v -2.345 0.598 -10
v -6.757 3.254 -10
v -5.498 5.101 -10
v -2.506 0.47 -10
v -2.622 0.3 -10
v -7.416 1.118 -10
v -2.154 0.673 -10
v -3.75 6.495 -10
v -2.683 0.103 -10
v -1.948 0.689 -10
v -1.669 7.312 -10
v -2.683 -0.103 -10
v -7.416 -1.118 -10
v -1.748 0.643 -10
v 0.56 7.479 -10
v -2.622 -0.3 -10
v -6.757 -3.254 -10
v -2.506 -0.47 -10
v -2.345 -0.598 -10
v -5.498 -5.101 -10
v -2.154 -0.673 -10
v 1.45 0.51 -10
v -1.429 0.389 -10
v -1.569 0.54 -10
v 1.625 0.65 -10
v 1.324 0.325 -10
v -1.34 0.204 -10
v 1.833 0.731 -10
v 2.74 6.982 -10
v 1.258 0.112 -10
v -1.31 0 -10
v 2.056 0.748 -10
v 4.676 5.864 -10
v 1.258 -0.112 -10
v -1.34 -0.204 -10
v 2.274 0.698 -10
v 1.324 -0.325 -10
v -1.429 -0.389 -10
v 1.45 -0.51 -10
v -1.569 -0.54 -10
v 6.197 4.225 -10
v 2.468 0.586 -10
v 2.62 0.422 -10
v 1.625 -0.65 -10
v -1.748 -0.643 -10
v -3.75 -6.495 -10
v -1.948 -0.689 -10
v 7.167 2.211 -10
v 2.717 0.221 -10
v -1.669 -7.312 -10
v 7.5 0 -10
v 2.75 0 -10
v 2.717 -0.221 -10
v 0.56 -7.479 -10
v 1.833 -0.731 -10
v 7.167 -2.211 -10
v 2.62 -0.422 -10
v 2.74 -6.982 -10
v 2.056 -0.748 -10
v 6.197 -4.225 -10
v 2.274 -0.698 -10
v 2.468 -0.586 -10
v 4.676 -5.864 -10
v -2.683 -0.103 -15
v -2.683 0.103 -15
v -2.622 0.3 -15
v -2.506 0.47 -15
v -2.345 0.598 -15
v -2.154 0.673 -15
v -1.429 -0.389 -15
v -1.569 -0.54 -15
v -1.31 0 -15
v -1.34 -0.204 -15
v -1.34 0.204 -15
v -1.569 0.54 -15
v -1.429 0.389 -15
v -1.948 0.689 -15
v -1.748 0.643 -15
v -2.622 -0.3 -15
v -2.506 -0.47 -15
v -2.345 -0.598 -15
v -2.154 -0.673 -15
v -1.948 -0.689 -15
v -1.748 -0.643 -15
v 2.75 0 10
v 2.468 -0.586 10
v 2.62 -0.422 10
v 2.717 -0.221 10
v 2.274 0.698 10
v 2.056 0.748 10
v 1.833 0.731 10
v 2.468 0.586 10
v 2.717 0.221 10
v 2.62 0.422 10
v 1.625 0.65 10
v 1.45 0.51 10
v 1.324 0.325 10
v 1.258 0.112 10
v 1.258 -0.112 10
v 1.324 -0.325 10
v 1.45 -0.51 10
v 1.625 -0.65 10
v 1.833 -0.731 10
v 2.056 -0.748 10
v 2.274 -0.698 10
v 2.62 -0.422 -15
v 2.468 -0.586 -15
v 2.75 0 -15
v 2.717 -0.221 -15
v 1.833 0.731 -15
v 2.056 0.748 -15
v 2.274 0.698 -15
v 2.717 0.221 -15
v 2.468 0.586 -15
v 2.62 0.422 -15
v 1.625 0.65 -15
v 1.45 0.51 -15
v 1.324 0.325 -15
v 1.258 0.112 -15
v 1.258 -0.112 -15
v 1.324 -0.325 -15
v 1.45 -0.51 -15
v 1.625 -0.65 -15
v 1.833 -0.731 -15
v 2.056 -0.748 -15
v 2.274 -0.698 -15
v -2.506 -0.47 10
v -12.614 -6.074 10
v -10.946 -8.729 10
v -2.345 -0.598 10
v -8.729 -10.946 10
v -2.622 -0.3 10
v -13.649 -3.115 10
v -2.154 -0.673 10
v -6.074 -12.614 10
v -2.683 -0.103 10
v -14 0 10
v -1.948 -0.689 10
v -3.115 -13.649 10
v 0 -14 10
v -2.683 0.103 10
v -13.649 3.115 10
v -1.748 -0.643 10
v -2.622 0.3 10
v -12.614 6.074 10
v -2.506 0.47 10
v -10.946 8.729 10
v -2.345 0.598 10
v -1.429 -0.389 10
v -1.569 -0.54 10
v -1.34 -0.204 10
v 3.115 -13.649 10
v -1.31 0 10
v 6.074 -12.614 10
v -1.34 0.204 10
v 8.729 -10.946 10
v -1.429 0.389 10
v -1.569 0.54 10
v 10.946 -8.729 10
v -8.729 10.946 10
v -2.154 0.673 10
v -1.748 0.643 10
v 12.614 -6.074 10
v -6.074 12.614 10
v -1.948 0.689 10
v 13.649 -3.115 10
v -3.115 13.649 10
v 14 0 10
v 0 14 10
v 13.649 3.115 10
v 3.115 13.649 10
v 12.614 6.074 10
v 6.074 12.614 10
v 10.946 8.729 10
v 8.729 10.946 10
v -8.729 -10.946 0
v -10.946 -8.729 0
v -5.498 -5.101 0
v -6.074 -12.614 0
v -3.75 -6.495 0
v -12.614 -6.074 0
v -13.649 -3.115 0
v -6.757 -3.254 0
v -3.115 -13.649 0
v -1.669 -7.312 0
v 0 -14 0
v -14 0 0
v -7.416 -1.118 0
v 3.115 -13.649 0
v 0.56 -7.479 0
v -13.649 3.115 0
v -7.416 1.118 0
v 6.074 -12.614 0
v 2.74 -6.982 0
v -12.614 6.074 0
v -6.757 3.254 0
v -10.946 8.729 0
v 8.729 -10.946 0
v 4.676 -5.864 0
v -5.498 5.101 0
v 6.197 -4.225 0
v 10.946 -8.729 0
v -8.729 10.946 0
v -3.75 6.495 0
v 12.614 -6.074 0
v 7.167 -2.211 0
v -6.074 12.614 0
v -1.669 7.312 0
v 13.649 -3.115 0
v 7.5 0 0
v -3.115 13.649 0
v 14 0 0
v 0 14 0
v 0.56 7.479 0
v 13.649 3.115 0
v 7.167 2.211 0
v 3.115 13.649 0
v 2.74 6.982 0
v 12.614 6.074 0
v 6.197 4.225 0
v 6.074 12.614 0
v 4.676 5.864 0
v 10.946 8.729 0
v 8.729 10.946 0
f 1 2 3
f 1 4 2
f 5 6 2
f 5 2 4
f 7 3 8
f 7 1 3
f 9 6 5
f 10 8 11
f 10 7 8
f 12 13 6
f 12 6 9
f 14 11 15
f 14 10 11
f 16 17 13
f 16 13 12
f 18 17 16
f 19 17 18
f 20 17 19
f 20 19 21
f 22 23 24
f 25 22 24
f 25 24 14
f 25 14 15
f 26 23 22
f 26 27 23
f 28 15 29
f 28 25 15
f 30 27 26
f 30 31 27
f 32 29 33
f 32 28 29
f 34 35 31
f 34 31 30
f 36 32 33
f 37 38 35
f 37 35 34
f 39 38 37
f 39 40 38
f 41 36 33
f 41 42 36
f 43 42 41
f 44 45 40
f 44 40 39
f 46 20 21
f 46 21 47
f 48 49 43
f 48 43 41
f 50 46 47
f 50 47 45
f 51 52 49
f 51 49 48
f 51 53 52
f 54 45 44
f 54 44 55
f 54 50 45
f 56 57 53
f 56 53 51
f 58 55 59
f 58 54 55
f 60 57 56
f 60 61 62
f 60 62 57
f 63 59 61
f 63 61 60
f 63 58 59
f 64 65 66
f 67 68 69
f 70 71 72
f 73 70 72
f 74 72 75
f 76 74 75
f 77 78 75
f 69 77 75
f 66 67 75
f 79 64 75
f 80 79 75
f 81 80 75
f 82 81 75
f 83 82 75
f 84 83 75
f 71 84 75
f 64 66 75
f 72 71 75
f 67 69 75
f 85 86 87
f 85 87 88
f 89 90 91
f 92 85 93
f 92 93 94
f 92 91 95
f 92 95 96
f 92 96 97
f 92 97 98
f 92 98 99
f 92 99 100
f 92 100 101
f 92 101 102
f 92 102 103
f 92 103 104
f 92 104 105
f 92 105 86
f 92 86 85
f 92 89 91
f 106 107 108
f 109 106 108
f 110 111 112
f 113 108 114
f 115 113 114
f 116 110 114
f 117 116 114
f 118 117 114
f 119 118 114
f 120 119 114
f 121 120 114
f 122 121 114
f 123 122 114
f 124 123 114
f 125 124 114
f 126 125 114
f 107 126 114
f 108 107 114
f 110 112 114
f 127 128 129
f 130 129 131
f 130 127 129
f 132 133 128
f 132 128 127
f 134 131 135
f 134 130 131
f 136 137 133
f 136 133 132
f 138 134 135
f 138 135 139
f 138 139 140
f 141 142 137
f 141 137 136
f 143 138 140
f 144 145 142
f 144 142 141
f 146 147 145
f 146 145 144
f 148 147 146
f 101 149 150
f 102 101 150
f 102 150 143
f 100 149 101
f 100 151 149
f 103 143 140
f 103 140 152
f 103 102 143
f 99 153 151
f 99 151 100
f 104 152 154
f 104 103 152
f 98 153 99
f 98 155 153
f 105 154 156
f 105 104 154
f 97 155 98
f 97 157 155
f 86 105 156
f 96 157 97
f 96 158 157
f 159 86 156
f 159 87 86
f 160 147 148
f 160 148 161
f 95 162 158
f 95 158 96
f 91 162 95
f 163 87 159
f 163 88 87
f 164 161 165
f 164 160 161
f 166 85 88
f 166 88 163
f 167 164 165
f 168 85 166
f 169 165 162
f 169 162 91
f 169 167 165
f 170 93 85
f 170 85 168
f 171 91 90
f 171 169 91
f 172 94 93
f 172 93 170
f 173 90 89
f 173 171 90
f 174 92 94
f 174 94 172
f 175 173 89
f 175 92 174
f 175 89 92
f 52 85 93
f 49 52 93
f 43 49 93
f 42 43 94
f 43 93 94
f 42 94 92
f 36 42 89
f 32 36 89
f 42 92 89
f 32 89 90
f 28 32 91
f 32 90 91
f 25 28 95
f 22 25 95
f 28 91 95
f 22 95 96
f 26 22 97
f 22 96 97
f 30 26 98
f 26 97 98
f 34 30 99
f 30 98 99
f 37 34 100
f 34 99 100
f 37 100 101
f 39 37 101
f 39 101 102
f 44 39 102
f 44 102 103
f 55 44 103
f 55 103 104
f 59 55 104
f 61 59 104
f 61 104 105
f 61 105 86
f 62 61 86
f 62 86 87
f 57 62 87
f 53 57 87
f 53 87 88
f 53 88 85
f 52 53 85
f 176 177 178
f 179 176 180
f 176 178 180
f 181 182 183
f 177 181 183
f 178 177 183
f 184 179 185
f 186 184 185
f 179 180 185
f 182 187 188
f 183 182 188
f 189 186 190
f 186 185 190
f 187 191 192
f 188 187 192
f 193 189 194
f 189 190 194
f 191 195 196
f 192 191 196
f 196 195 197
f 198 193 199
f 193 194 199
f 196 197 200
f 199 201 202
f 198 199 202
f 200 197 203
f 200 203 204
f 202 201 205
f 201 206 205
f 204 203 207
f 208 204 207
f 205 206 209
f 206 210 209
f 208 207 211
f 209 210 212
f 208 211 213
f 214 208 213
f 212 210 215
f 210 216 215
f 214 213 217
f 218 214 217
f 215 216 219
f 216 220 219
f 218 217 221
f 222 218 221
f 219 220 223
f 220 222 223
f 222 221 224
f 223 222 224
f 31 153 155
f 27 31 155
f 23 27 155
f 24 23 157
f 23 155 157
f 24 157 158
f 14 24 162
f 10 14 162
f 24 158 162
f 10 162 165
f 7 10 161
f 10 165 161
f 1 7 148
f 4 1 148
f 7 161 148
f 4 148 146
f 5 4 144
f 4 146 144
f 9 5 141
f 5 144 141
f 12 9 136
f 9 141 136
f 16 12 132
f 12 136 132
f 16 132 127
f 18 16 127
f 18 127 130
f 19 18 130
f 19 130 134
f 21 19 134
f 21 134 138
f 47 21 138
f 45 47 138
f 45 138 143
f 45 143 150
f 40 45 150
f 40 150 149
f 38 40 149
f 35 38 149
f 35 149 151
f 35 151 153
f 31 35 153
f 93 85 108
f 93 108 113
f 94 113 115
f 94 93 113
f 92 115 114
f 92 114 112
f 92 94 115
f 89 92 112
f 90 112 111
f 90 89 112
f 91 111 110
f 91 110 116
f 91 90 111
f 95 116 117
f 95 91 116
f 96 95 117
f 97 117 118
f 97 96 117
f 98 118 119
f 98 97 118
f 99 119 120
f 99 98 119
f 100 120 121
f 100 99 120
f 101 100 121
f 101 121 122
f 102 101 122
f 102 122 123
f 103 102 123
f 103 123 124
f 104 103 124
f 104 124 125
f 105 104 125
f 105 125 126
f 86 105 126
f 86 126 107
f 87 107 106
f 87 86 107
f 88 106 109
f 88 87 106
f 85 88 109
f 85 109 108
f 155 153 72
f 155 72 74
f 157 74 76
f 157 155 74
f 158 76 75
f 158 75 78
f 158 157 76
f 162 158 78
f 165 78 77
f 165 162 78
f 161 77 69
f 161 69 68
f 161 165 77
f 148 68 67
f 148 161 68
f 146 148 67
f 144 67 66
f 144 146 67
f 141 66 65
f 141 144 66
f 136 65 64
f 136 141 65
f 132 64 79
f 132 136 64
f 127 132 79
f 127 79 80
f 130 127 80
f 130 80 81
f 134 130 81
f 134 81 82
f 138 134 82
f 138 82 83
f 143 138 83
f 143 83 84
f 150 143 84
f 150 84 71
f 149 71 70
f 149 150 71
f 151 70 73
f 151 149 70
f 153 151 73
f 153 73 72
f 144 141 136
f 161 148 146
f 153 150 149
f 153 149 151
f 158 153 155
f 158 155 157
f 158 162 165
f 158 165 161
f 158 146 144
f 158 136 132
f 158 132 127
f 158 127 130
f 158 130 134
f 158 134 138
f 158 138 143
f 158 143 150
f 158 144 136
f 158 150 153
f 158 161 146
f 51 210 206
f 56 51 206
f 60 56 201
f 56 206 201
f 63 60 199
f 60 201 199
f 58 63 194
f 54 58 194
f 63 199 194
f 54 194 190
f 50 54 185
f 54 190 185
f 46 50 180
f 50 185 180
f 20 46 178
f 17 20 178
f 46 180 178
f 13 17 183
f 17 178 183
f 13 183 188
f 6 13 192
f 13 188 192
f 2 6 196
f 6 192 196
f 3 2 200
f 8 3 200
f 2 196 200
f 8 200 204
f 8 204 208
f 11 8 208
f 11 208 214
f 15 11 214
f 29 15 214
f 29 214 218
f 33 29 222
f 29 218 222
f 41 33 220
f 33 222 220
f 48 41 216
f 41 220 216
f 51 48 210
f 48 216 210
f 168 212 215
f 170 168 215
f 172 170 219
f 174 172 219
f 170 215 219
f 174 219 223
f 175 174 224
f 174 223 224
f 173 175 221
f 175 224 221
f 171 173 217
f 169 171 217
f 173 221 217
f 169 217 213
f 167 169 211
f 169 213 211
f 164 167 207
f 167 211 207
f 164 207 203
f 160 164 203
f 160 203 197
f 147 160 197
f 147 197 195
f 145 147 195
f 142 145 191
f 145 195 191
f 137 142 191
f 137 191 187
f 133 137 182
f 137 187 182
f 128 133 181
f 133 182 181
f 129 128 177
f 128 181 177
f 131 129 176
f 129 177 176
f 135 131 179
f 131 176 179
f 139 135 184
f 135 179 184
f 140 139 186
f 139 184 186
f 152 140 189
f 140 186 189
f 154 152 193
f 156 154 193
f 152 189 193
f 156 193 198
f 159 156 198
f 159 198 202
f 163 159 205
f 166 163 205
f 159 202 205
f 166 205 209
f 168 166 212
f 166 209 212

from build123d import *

# Parameters (mm, degrees)
F0_R     = 14
F1_DEPTH = 10
F2_R     = 7.5
F3_DEPTH = 10
F4_R     = 0.690496
F4_R_2   = 0.75
F5_DEPTH = 25
F6_DEPTH = 25


with BuildPart() as f1:
    # F0 (on Top) → F1 (new body)
    with BuildSketch(Plane.XY):
        Circle(F0_R)
    extrude(amount=F1_DEPTH)

    # F2 (on face) → F3 (join)
    with BuildSketch(Plane(origin=(0, 0, 0), x_dir=(1, 0, 0), z_dir=(0, 0, -1))):
        Circle(F2_R)
    extrude(amount=F3_DEPTH)

    # F4 (on face) → F5 (cut)
    with BuildSketch(Plane.XY.offset(10)):
        with Locations((-2, 0)):
            Circle(F4_R)
        with Locations((2, 0)):
            Circle(F4_R_2)
    extrude(amount=-F5_DEPTH, mode=Mode.SUBTRACT)


with BuildPart() as f6:
    # F4 (on face) → F6 (new body)
    with BuildSketch(Plane.XY.offset(10)):
        with Locations((-2, 0)):
            Circle(F4_R)
        with Locations((2, 0)):
            Circle(F4_R_2)
    extrude(amount=-F6_DEPTH)


solid = Compound([f1.part, f6.part])
